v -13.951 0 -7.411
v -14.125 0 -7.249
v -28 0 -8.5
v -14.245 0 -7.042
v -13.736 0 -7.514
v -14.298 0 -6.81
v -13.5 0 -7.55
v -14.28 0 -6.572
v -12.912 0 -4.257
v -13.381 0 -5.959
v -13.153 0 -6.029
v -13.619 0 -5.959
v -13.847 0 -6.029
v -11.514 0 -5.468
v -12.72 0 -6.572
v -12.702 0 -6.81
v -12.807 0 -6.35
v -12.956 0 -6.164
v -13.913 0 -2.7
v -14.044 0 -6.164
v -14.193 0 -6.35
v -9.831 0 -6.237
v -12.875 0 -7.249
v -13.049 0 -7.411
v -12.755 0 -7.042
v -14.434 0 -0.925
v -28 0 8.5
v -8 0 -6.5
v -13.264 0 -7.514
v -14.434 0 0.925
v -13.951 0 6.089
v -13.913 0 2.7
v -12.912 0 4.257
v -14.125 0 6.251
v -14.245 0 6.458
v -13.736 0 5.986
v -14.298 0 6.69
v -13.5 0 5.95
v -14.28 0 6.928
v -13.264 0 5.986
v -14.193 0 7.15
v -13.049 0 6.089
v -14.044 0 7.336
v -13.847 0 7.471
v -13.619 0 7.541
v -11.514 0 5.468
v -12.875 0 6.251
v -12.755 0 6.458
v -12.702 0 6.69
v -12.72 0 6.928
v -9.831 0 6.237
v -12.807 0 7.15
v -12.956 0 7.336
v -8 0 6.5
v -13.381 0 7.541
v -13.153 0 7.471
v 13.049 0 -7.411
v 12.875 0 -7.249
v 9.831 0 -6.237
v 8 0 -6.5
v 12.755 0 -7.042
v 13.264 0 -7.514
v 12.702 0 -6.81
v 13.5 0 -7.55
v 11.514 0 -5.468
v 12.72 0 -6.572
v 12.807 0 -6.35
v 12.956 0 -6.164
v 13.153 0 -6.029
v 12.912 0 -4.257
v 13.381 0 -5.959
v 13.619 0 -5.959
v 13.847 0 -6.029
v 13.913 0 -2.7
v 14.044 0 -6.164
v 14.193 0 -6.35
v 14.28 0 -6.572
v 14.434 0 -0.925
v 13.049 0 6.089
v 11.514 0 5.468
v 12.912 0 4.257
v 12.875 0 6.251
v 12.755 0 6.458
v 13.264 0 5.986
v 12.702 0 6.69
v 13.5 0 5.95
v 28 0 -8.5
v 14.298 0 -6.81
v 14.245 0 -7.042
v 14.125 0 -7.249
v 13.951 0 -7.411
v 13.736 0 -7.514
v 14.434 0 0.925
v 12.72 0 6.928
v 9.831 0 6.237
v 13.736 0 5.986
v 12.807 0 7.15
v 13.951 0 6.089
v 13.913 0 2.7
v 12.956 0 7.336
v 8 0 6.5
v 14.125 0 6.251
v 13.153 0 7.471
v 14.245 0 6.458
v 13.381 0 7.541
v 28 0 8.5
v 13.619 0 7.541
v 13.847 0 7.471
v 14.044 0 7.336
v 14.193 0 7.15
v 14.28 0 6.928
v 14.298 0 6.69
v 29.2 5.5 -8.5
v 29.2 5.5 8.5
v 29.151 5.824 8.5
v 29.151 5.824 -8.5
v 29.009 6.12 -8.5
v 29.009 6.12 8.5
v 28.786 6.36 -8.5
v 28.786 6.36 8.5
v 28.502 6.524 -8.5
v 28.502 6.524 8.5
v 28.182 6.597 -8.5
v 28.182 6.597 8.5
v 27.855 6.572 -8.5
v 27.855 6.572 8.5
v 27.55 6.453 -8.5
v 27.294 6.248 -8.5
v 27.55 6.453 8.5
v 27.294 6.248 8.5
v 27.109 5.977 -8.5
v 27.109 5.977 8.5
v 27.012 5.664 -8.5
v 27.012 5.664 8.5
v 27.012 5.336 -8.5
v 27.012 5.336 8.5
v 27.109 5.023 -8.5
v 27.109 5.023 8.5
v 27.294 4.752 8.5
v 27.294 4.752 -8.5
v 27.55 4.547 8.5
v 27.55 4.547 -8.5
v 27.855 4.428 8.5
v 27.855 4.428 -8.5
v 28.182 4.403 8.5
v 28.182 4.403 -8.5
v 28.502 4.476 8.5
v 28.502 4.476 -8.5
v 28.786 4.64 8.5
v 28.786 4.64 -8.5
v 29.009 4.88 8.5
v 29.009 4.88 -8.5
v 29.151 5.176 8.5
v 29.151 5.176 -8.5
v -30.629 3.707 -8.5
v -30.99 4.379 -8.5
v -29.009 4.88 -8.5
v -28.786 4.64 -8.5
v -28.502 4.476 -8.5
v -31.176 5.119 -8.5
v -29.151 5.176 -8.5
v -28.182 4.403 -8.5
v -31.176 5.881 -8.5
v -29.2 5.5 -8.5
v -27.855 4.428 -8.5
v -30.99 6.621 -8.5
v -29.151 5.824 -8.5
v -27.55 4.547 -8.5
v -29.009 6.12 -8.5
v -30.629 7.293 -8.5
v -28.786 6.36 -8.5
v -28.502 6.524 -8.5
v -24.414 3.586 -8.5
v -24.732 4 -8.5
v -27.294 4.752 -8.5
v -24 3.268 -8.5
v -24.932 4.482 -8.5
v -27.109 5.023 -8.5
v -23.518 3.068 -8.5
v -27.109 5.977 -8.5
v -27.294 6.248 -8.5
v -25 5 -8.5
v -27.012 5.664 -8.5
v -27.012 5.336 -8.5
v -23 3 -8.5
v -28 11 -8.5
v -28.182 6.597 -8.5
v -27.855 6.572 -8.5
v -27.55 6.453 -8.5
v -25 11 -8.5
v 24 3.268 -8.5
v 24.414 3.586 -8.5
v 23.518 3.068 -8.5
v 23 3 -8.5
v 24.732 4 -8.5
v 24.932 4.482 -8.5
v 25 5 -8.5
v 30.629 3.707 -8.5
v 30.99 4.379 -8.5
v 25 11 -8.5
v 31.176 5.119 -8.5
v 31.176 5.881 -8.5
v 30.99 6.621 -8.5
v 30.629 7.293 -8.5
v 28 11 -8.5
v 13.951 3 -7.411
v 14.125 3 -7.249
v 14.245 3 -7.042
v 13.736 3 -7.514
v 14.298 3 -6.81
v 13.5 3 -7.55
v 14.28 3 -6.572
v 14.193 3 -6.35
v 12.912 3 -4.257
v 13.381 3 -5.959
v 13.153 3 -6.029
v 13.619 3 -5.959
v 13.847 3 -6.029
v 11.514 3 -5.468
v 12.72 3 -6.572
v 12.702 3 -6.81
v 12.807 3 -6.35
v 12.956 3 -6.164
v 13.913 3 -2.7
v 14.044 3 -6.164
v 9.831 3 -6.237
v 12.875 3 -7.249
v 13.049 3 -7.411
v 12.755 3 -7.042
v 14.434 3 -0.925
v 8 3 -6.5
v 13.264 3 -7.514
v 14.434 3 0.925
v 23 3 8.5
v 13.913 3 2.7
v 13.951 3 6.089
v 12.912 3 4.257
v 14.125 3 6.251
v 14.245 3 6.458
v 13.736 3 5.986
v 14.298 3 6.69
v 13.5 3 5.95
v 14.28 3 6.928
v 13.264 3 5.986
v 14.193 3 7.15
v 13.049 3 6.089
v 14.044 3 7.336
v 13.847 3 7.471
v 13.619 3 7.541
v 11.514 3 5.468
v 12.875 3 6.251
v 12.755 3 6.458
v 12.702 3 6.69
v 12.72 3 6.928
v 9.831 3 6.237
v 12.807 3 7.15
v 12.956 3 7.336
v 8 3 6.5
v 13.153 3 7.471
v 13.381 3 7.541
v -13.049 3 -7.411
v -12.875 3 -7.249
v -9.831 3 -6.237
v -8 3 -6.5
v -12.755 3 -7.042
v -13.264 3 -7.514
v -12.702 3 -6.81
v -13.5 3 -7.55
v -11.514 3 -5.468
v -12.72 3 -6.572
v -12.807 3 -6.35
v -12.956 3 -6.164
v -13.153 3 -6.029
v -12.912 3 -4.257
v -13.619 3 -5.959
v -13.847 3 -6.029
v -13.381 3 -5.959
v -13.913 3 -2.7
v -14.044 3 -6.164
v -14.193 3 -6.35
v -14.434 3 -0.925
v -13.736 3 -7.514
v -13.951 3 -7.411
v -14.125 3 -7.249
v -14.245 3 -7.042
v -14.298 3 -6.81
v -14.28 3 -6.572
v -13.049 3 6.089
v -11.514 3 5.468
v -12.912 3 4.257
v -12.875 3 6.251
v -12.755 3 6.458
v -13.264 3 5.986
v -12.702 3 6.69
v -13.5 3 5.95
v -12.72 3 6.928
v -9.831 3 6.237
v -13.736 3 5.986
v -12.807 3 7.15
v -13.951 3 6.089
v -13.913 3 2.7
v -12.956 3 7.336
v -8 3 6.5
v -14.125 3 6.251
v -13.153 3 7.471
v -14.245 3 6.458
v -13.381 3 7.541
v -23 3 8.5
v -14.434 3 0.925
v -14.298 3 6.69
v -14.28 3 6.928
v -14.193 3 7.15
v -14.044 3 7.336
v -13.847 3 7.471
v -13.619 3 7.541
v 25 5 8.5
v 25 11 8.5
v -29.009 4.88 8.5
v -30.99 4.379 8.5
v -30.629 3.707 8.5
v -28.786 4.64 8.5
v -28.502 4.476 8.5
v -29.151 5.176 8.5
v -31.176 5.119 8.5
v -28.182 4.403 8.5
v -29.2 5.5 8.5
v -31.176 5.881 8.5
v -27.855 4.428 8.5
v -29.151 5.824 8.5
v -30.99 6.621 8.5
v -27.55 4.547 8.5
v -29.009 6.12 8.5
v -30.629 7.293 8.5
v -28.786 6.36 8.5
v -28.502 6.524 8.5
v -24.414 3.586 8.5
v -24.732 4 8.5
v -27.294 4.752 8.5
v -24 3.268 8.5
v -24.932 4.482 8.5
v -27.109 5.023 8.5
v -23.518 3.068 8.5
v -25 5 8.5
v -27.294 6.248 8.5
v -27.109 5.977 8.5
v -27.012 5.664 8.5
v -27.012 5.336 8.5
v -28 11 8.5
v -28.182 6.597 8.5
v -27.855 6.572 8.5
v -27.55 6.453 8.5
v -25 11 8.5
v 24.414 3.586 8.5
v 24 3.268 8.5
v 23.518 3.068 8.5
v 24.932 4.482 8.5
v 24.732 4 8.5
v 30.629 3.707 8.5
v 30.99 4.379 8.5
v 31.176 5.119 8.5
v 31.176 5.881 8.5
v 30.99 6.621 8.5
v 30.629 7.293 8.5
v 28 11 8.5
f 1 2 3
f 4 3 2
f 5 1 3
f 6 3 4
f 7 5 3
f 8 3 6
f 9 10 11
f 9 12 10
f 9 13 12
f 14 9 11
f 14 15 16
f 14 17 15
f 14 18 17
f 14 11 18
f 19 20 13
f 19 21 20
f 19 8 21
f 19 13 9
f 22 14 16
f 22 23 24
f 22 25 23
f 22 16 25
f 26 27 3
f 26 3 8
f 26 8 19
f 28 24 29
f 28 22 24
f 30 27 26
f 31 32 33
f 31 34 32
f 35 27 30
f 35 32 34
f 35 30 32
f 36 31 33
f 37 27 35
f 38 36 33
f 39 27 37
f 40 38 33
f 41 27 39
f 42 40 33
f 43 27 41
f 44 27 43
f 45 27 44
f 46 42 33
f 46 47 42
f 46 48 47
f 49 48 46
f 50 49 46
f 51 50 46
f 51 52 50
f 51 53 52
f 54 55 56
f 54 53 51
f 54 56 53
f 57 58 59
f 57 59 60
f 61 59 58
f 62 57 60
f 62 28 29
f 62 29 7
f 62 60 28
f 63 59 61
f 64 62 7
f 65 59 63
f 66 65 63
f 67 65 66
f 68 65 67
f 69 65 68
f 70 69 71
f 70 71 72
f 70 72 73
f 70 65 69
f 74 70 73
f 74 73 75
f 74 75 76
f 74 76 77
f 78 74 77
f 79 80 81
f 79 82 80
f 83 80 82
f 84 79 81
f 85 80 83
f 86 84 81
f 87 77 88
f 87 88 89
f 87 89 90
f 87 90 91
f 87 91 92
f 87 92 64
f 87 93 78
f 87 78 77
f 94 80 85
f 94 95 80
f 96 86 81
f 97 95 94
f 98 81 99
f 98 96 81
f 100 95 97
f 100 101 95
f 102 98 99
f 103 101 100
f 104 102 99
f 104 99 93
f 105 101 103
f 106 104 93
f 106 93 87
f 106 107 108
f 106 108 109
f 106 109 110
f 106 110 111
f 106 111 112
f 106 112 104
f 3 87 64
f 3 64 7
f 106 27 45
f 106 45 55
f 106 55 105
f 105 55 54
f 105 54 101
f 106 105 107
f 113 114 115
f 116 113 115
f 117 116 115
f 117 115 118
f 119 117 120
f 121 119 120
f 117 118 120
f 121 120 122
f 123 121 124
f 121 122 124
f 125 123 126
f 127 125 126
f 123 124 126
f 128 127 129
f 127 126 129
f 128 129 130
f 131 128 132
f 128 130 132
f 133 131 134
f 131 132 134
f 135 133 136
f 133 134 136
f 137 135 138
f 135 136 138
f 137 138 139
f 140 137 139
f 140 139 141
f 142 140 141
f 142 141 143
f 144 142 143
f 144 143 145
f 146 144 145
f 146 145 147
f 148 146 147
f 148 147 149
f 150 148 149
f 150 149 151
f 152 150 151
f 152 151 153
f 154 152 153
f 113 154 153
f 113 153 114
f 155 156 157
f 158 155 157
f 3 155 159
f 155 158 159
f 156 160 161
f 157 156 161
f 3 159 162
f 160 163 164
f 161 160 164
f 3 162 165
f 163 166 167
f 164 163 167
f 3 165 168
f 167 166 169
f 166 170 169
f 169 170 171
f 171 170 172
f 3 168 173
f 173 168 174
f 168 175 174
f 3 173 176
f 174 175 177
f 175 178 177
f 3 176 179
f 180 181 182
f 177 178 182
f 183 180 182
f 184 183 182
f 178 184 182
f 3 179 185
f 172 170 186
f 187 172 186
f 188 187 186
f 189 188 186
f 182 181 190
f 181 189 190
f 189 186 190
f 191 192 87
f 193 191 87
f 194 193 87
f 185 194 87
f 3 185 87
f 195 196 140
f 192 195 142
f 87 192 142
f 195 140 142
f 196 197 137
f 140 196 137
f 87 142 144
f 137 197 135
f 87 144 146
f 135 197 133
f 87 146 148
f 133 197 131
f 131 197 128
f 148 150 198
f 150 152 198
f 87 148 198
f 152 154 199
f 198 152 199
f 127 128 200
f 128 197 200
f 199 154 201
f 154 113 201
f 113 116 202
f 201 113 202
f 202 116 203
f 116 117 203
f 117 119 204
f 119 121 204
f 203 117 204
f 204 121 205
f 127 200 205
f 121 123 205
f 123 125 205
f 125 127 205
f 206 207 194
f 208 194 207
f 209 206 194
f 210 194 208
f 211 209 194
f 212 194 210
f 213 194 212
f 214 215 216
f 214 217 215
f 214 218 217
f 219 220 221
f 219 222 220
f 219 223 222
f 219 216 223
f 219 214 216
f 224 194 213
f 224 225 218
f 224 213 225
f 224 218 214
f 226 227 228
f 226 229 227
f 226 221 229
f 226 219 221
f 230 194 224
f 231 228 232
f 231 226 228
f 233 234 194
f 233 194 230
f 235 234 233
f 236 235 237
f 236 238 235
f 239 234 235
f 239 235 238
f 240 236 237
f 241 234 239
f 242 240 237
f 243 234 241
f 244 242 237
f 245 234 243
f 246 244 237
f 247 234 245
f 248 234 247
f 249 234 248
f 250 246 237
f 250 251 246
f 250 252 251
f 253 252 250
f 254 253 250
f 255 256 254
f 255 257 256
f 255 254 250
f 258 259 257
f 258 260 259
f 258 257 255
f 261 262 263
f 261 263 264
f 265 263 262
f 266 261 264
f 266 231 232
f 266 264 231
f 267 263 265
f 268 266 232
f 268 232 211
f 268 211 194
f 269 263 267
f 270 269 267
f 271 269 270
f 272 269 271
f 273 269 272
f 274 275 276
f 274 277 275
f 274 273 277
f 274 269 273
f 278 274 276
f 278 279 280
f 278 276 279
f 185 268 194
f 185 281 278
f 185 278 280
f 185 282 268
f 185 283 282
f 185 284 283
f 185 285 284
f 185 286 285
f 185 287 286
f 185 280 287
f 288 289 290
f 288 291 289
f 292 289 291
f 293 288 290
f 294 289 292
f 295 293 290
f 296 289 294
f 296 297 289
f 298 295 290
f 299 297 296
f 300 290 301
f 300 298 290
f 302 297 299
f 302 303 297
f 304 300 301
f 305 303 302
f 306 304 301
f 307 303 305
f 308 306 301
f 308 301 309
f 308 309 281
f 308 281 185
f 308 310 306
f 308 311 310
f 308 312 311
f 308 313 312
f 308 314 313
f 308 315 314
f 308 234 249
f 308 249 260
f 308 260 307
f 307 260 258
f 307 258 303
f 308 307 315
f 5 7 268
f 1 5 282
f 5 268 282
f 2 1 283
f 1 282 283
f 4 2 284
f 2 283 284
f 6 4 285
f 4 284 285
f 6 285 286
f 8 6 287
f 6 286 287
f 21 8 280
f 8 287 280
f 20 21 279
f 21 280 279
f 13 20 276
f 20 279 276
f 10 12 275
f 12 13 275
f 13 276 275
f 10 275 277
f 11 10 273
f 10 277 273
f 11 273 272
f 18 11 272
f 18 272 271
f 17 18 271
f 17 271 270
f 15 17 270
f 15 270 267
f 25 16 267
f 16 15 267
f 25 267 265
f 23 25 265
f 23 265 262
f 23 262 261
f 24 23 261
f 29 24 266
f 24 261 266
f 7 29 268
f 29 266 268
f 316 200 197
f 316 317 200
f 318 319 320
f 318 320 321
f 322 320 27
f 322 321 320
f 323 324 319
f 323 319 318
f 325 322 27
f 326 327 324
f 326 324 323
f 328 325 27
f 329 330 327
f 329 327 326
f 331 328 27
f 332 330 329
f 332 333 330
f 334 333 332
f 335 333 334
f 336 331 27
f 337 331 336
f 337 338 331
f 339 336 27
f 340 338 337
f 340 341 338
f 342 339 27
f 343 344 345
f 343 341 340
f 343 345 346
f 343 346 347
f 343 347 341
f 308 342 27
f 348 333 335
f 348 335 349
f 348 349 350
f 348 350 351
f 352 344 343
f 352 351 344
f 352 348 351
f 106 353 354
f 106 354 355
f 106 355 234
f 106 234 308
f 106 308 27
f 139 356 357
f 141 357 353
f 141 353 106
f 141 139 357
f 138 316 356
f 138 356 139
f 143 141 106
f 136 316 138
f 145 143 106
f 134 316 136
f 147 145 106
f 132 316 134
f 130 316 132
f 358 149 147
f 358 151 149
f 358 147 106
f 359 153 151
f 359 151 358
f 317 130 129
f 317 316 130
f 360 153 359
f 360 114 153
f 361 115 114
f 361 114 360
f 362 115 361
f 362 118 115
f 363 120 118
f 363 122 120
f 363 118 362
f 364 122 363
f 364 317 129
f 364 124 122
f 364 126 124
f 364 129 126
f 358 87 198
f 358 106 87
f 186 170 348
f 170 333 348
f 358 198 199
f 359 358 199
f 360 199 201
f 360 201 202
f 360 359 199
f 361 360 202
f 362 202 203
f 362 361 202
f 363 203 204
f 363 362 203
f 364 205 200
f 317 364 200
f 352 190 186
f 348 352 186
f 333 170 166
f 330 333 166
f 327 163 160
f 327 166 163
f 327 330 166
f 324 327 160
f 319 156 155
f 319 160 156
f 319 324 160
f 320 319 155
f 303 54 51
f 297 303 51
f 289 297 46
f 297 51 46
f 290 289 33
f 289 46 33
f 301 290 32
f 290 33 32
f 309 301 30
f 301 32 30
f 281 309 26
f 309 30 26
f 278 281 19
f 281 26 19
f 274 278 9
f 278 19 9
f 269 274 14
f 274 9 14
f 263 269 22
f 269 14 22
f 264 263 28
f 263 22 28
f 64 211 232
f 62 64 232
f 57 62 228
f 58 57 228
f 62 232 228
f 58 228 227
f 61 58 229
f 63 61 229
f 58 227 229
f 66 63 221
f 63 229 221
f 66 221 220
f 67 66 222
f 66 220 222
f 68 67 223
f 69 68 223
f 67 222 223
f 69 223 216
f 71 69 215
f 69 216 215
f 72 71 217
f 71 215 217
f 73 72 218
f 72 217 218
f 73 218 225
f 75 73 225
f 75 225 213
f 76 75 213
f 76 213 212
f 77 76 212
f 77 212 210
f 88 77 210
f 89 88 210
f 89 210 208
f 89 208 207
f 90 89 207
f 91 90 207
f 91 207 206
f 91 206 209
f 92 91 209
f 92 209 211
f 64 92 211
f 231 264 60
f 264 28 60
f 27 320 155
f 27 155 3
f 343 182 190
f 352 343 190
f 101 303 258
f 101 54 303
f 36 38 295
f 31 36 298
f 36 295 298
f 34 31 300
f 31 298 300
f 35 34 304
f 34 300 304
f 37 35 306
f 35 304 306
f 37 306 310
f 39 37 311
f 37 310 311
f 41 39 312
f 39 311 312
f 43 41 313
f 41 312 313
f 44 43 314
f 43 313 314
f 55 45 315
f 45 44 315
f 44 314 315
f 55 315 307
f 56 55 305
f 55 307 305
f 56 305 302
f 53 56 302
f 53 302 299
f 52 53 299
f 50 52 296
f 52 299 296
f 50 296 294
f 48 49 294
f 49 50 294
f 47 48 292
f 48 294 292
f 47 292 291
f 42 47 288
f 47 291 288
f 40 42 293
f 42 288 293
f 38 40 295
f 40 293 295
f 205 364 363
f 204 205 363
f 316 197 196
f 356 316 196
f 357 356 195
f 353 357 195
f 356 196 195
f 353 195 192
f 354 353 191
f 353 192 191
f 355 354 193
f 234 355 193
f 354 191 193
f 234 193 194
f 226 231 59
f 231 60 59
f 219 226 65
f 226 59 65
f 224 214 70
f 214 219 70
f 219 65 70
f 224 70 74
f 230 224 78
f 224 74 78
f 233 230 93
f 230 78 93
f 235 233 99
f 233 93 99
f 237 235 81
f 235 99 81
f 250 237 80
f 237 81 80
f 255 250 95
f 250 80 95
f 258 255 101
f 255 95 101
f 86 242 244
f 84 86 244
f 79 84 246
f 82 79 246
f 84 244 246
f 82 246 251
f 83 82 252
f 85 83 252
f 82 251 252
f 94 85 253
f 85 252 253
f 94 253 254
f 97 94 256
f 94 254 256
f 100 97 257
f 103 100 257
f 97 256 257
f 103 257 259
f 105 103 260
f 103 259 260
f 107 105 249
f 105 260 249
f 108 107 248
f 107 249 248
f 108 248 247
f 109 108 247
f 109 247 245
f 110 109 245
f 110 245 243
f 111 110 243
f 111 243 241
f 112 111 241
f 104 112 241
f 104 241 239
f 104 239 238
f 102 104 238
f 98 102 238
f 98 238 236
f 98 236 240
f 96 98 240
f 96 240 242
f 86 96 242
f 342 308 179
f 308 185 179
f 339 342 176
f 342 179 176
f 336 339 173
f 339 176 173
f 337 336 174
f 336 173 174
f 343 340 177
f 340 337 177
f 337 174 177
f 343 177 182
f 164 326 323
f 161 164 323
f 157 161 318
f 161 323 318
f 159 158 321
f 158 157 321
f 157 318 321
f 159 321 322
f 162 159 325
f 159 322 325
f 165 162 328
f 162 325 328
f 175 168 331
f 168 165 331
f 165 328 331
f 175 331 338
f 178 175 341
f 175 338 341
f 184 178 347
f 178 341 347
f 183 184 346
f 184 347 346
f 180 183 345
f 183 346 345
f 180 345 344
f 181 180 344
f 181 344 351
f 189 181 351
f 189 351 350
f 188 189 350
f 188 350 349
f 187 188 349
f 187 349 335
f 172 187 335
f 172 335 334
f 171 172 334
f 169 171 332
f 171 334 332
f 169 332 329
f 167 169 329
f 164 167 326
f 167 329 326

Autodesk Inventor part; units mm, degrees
ref_plane "YZ Plane" through (0, 0, 0) normal (1, 0, 0) x (0, 1, 0)
ref_plane "XZ Plane" through (0, 0, 0) normal (0, 1, 0) x (-1, 0, 0)
ref_plane "XY Plane" through (0, 0, 0) normal (0, 0, 1) x (1, 0, 0)
sketch "スケッチ1" plane through (0, 0, 0) normal (0, 1, 0) x (-1, 0, 0)
  line L0 (0, 6.75) -> (-13.5, 6.75) construction
  line L1 (-13.5, 6.75) -> (-13.5, -6.75) construction
  line L2 (-13.5, -6.75) -> (0, -6.75) construction
  line L3 (0, -6.75) -> (0, 6.75) construction
  circle A0 centre (-8, 0) radius 6.5
  line L4 (0, 8.5) -> (-25, 8.5)
  line L5 (-25, 8.5) -> (-25, -8.5)
  line L6 (-25, -8.5) -> (0, -8.5)
  line L7 (0, -8.5) -> (0, 8.5)
  line L8 (-25, 8.5) -> (-27.8, 8.5)
  line L9 (-27.8, 8.5) -> (-27.8, -8.5)
  line L10 (-27.8, -8.5) -> (-25, -8.5)
  line L11 (-25, -8.5) -> (-25, 8.5)
  line L12 (0, 6.5) -> (-8, 6.5)
  line L13 (0, -6.5) -> (-8, -6.5)
  point P0 (0, 0)
  point P1 (0, 0)
  dimension "d0" = 13.5
  dimension "d1" = 13.5
  dimension "d2" = 8
  dimension "d3" = 13
  dimension "d4" = 17
  dimension "d5" = 25
  dimension "d6" = 2.8
extrude "押し出し1" add sketch "スケッチ1" along normal blind 3 contours A0 L13 L7 L6 L5 L4 L12
hole "穴1" at (13.5, 0, -6.75) at (13.5, 0, 6.75) direction (0, 1, 0) diameter 1.6 end through all clearance for "Flat Head Machine Screw (82)" size "#0" standard "Ansi Unified Screw Threads"
sketch "スケッチ2" plane through (0, 0, 8.5) normal (0, 0, 1) x (1, 0, 0)
  line L0 (25, 0) -> (25, 3) projected
  line L1 (0, 3) -> (25, 3) projected
  line L2 (25, 0) -> (28, 0)
  line L3 (28, 0) -> (28, 11) construction
  line L4 (28, 11) -> (25, 11)
  line L5 (25, 11) -> (25, 0)
  circle A0 centre (28.1, 5.5) radius 1.1
  arc A1 (30.6287, 7.2932) -> (30.6287, 3.7068) centre (28.1, 5.5) ccw construction
  line L6 (28, 11) -> (30.6287, 7.2932)
  line L7 (28, 0) -> (30.6287, 3.7068)
  arc A2 (30.6287, 3.7068) -> (30.6287, 7.2932) centre (28.1, 5.5) ccw
  dimension "d9" = 2.2
  dimension "d10" = 3
  dimension "d12" = 8
  dimension "d13" = 6.2
extrude "押し出し2" add sketch "スケッチ2" against normal up to surface (17 mm away)
fillet "フィレット1" radius 2 1 edges at (25, 3, 0)
mirror "ミラー1" about plane through (0, 0, -8.5) normal (-1, 0, 0) of "押し出し1", "穴1", "押し出し2", "フィレット1"
properties part number "Ultrasonic_holder"
